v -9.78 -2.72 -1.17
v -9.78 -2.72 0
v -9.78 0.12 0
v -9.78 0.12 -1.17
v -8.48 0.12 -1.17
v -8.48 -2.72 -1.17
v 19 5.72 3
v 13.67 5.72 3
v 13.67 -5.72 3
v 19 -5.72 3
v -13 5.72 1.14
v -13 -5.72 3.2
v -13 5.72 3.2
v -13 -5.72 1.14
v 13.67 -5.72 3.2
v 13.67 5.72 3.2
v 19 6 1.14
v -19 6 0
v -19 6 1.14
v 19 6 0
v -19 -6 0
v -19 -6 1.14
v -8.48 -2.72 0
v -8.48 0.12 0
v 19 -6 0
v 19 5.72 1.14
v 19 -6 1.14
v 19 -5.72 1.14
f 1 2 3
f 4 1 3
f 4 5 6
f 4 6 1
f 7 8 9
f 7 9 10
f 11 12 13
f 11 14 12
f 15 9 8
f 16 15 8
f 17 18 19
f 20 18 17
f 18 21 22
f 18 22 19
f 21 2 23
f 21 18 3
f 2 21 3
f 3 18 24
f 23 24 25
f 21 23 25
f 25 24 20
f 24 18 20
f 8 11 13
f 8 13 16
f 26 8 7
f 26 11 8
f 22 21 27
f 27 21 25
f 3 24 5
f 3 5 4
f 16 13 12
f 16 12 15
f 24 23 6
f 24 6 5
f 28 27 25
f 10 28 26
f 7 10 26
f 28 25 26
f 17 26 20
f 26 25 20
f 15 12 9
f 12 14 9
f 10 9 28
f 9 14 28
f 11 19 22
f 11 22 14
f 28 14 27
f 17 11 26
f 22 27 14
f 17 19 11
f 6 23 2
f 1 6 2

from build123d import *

# Parameters (mm, degrees)
SKETCH_1_W      = 38
SKETCH_1_H      = 12
EXTRUDE_1_DEPTH = 1.14
SKETCH_2_W      = 1.3
SKETCH_2_H      = 2.84
EXTRUDE_2_DEPTH = 1.17
SKETCH_3_W      = 32
SKETCH_3_H      = 11.44
EXTRUDE_3_DEPTH = 1.86
SKETCH_4_W      = 26.67
SKETCH_4_H      = 11.44
EXTRUDE_4_DEPTH = 0.2


with BuildPart() as part:
    # Эскиз1 → Бобышка-Вытянуть1 (new body)
    with BuildSketch(Plane.XY):
        Rectangle(SKETCH_1_W, SKETCH_1_H)
    extrude(amount=EXTRUDE_1_DEPTH)

    # Эскиз2 → Бобышка-Вытянуть2 (add)
    with BuildSketch(Plane(origin=(0, 0, 0), x_dir=(-1, 0, 0), z_dir=(0, 0, -1))):
        with Locations((9.13, -1.3)):
            Rectangle(SKETCH_2_W, SKETCH_2_H)
    extrude(amount=EXTRUDE_2_DEPTH)

    # Эскиз3 → Бобышка-Вытянуть3 (add)
    with BuildSketch(Plane.XY.offset(1.14)):
        with Locations((3, 0)):
            Rectangle(SKETCH_3_W, SKETCH_3_H)
    extrude(amount=EXTRUDE_3_DEPTH)

    # Эскиз4 → Бобышка-Вытянуть4 (add)
    with BuildSketch(Plane.XY.offset(3)):
        with Locations((0.335, 0)):
            Rectangle(SKETCH_4_W, SKETCH_4_H)
    extrude(amount=EXTRUDE_4_DEPTH)


solid = part.part
